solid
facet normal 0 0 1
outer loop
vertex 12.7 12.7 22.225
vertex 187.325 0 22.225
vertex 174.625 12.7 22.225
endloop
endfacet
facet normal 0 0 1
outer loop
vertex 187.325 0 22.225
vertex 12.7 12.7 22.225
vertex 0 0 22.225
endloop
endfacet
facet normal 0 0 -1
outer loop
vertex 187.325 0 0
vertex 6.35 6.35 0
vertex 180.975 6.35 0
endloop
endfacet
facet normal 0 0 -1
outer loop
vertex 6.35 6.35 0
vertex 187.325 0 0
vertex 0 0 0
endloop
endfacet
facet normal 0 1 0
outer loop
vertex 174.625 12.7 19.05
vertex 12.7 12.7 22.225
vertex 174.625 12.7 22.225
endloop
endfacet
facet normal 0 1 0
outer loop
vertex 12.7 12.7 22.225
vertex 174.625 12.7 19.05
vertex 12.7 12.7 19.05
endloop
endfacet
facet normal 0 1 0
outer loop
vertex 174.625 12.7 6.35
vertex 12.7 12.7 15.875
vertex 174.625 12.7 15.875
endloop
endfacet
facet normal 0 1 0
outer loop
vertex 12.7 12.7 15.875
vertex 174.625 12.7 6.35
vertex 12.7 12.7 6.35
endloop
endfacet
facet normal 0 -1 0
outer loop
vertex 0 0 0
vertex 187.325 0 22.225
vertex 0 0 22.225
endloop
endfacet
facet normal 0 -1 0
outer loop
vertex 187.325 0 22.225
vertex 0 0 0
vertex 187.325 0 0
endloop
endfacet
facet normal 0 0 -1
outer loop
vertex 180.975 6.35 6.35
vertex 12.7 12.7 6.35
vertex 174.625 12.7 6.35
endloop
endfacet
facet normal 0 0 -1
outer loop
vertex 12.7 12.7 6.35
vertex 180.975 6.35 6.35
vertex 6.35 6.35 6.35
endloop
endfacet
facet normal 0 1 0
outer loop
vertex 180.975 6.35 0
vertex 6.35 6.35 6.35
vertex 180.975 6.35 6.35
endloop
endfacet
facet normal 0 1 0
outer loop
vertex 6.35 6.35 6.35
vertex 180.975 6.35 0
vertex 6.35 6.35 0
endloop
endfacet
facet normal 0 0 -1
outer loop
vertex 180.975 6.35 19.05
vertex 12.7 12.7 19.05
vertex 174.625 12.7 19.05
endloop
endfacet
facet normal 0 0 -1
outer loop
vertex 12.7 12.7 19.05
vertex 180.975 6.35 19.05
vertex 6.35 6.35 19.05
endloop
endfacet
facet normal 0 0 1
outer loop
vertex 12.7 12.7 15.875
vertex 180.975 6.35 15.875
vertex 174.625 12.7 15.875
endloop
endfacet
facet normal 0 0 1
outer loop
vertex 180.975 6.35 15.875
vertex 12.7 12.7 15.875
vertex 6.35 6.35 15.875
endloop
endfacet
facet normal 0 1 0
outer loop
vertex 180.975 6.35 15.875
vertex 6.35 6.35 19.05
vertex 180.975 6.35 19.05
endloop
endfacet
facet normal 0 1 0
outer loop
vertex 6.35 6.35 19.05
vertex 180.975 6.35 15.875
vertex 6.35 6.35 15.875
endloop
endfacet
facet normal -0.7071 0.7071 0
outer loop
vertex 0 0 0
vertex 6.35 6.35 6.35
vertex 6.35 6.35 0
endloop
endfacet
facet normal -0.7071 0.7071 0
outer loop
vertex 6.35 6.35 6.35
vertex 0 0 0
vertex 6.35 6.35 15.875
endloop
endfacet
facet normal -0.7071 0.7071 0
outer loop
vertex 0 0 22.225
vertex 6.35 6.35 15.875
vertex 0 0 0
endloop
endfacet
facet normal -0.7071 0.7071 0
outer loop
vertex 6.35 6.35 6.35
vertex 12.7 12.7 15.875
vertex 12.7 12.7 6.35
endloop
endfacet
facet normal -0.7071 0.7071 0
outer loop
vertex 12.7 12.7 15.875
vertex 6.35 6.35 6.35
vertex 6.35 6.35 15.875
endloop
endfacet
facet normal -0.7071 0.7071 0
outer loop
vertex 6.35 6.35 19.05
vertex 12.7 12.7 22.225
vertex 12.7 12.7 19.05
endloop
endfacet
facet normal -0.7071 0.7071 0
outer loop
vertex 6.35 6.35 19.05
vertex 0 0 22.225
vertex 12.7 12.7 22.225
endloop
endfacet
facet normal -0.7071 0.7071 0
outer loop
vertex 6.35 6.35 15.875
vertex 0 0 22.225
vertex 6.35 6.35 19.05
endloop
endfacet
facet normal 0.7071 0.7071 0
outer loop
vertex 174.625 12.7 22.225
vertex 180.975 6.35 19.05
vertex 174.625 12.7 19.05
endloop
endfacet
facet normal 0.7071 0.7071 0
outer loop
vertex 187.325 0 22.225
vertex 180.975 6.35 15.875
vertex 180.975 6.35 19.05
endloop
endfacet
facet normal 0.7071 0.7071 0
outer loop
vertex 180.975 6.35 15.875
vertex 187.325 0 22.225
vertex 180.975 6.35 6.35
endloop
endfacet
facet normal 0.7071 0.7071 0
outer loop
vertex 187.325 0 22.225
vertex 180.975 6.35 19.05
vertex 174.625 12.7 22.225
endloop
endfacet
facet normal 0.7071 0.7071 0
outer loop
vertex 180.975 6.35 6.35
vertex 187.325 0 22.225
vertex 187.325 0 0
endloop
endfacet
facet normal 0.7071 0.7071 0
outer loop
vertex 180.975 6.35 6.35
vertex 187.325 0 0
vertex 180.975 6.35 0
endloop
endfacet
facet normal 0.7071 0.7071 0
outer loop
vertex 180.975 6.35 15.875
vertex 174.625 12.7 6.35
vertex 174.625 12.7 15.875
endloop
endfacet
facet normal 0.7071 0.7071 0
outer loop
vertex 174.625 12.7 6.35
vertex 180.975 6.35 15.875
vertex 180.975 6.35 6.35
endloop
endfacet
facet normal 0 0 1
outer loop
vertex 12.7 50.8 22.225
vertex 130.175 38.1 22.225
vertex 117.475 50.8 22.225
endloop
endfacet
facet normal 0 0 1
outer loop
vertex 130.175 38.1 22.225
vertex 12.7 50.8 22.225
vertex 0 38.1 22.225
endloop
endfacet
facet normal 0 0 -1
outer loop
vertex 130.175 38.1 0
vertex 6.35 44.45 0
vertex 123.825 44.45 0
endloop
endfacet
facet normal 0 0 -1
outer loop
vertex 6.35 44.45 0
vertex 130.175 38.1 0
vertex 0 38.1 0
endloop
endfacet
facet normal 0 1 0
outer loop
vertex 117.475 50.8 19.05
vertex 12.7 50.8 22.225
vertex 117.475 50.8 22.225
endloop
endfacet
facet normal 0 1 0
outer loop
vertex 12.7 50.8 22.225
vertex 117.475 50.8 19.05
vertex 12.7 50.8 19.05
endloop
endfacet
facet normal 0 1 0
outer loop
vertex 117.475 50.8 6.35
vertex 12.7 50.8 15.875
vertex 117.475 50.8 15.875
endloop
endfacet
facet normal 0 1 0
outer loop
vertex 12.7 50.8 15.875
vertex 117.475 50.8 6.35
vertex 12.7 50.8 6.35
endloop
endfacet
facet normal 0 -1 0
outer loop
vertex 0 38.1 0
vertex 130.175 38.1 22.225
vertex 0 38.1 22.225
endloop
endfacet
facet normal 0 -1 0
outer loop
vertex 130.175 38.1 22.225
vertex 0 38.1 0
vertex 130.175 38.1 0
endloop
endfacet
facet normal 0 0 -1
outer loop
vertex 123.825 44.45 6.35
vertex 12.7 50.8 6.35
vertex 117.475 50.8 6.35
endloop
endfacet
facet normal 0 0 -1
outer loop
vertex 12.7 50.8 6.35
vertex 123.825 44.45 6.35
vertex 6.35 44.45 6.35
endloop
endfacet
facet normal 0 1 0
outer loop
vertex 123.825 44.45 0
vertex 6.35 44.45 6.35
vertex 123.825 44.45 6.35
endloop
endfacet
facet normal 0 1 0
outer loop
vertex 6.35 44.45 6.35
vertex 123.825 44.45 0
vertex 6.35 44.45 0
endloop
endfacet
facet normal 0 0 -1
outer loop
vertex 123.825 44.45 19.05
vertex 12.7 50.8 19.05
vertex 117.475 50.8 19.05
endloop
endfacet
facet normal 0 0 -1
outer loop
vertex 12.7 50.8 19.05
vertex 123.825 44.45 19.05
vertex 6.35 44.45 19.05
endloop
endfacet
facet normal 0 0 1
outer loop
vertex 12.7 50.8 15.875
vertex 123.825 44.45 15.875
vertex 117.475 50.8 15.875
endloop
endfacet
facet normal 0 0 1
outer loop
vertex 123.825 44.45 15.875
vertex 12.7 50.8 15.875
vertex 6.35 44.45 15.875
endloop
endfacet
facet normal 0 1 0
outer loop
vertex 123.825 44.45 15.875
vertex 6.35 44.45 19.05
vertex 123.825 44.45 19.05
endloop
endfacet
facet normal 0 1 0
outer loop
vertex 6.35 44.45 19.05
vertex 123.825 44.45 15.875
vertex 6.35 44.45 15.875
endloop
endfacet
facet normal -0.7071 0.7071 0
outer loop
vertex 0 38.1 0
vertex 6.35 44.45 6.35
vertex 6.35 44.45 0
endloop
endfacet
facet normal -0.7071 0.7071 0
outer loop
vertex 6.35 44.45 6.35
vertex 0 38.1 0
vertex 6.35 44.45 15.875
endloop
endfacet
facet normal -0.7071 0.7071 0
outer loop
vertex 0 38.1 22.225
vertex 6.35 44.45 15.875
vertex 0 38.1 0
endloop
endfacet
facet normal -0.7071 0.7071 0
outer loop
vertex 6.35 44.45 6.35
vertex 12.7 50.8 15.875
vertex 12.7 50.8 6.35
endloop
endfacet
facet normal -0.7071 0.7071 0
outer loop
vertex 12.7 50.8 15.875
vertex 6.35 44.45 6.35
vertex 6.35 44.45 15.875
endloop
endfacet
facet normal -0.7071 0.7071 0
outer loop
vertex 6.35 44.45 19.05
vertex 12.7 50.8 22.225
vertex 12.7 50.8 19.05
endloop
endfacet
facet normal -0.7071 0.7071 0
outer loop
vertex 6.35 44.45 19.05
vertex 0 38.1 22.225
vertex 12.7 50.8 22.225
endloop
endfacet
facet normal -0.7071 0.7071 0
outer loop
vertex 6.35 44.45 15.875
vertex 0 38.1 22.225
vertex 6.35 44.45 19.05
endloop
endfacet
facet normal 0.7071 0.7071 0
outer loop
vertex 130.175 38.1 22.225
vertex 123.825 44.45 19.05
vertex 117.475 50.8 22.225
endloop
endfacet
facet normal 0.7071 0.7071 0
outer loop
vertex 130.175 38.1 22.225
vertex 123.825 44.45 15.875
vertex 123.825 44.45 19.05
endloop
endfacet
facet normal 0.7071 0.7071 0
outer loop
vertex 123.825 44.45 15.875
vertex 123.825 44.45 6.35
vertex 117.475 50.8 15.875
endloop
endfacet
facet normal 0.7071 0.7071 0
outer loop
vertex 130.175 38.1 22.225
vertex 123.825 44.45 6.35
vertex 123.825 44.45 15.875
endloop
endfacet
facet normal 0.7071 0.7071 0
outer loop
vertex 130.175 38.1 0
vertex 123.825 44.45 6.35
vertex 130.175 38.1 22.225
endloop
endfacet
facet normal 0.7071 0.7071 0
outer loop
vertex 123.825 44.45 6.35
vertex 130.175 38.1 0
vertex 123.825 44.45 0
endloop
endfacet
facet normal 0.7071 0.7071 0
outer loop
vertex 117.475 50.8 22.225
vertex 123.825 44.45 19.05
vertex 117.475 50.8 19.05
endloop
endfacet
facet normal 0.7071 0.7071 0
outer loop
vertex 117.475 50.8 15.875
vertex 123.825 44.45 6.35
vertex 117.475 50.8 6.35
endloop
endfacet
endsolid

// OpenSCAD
// file: funcs.scad
include <MCAD/constants.scad>;

function inches(n) = n*mm_per_inch;

module right_triangle(width, height, thickness) {
    linear_extrude(height=thickness, center = false)
        polygon([[0, 0], [0, height], [width, height]]);
}

// testing
right_triangle(20, 30, 10);
// main file
use <funcs.scad>;

module frame_bar(item_width, item_thickness, frame_width, pane_thickness, pane_inset_x, pane_inset_z, backing_thickness, backing_inset) {
    total_width = item_width + 2*frame_width;
    total_thickness = backing_thickness + item_thickness + pane_thickness + pane_inset_z;
    difference() {
        cube([total_width, frame_width, total_thickness]);
        // backing
        translate([-0.1, backing_inset, -0.1])
            cube([total_width + 0.2, frame_width, backing_thickness + 0.1]);
        // pane
        translate([-0.1, pane_inset_x, backing_thickness + item_thickness])
            cube([total_width + 0.2, frame_width, pane_thickness]);
        // bottom corner
        translate([-0.1, -0.1, -0.1])
            right_triangle(frame_width + 0.2, frame_width + 0.2, total_thickness + 0.2);
        // top corner
        translate([total_width + 0.1, -0.1, -0.1])
            right_triangle(-frame_width - 0.2, frame_width + 0.2, total_thickness + 0.2);
    }
}

// testing
frame_bar(inches(6.375), inches(0.375), inches(0.5), inches(0.125), inches(0.25), inches(0.125), inches(0.25), inches(0.25));
translate([0, inches(1.5), 0])
    frame_bar(inches(4.125), inches(0.375), inches(0.5), inches(0.125), inches(0.25), inches(0.125), inches(0.25), inches(0.25));
